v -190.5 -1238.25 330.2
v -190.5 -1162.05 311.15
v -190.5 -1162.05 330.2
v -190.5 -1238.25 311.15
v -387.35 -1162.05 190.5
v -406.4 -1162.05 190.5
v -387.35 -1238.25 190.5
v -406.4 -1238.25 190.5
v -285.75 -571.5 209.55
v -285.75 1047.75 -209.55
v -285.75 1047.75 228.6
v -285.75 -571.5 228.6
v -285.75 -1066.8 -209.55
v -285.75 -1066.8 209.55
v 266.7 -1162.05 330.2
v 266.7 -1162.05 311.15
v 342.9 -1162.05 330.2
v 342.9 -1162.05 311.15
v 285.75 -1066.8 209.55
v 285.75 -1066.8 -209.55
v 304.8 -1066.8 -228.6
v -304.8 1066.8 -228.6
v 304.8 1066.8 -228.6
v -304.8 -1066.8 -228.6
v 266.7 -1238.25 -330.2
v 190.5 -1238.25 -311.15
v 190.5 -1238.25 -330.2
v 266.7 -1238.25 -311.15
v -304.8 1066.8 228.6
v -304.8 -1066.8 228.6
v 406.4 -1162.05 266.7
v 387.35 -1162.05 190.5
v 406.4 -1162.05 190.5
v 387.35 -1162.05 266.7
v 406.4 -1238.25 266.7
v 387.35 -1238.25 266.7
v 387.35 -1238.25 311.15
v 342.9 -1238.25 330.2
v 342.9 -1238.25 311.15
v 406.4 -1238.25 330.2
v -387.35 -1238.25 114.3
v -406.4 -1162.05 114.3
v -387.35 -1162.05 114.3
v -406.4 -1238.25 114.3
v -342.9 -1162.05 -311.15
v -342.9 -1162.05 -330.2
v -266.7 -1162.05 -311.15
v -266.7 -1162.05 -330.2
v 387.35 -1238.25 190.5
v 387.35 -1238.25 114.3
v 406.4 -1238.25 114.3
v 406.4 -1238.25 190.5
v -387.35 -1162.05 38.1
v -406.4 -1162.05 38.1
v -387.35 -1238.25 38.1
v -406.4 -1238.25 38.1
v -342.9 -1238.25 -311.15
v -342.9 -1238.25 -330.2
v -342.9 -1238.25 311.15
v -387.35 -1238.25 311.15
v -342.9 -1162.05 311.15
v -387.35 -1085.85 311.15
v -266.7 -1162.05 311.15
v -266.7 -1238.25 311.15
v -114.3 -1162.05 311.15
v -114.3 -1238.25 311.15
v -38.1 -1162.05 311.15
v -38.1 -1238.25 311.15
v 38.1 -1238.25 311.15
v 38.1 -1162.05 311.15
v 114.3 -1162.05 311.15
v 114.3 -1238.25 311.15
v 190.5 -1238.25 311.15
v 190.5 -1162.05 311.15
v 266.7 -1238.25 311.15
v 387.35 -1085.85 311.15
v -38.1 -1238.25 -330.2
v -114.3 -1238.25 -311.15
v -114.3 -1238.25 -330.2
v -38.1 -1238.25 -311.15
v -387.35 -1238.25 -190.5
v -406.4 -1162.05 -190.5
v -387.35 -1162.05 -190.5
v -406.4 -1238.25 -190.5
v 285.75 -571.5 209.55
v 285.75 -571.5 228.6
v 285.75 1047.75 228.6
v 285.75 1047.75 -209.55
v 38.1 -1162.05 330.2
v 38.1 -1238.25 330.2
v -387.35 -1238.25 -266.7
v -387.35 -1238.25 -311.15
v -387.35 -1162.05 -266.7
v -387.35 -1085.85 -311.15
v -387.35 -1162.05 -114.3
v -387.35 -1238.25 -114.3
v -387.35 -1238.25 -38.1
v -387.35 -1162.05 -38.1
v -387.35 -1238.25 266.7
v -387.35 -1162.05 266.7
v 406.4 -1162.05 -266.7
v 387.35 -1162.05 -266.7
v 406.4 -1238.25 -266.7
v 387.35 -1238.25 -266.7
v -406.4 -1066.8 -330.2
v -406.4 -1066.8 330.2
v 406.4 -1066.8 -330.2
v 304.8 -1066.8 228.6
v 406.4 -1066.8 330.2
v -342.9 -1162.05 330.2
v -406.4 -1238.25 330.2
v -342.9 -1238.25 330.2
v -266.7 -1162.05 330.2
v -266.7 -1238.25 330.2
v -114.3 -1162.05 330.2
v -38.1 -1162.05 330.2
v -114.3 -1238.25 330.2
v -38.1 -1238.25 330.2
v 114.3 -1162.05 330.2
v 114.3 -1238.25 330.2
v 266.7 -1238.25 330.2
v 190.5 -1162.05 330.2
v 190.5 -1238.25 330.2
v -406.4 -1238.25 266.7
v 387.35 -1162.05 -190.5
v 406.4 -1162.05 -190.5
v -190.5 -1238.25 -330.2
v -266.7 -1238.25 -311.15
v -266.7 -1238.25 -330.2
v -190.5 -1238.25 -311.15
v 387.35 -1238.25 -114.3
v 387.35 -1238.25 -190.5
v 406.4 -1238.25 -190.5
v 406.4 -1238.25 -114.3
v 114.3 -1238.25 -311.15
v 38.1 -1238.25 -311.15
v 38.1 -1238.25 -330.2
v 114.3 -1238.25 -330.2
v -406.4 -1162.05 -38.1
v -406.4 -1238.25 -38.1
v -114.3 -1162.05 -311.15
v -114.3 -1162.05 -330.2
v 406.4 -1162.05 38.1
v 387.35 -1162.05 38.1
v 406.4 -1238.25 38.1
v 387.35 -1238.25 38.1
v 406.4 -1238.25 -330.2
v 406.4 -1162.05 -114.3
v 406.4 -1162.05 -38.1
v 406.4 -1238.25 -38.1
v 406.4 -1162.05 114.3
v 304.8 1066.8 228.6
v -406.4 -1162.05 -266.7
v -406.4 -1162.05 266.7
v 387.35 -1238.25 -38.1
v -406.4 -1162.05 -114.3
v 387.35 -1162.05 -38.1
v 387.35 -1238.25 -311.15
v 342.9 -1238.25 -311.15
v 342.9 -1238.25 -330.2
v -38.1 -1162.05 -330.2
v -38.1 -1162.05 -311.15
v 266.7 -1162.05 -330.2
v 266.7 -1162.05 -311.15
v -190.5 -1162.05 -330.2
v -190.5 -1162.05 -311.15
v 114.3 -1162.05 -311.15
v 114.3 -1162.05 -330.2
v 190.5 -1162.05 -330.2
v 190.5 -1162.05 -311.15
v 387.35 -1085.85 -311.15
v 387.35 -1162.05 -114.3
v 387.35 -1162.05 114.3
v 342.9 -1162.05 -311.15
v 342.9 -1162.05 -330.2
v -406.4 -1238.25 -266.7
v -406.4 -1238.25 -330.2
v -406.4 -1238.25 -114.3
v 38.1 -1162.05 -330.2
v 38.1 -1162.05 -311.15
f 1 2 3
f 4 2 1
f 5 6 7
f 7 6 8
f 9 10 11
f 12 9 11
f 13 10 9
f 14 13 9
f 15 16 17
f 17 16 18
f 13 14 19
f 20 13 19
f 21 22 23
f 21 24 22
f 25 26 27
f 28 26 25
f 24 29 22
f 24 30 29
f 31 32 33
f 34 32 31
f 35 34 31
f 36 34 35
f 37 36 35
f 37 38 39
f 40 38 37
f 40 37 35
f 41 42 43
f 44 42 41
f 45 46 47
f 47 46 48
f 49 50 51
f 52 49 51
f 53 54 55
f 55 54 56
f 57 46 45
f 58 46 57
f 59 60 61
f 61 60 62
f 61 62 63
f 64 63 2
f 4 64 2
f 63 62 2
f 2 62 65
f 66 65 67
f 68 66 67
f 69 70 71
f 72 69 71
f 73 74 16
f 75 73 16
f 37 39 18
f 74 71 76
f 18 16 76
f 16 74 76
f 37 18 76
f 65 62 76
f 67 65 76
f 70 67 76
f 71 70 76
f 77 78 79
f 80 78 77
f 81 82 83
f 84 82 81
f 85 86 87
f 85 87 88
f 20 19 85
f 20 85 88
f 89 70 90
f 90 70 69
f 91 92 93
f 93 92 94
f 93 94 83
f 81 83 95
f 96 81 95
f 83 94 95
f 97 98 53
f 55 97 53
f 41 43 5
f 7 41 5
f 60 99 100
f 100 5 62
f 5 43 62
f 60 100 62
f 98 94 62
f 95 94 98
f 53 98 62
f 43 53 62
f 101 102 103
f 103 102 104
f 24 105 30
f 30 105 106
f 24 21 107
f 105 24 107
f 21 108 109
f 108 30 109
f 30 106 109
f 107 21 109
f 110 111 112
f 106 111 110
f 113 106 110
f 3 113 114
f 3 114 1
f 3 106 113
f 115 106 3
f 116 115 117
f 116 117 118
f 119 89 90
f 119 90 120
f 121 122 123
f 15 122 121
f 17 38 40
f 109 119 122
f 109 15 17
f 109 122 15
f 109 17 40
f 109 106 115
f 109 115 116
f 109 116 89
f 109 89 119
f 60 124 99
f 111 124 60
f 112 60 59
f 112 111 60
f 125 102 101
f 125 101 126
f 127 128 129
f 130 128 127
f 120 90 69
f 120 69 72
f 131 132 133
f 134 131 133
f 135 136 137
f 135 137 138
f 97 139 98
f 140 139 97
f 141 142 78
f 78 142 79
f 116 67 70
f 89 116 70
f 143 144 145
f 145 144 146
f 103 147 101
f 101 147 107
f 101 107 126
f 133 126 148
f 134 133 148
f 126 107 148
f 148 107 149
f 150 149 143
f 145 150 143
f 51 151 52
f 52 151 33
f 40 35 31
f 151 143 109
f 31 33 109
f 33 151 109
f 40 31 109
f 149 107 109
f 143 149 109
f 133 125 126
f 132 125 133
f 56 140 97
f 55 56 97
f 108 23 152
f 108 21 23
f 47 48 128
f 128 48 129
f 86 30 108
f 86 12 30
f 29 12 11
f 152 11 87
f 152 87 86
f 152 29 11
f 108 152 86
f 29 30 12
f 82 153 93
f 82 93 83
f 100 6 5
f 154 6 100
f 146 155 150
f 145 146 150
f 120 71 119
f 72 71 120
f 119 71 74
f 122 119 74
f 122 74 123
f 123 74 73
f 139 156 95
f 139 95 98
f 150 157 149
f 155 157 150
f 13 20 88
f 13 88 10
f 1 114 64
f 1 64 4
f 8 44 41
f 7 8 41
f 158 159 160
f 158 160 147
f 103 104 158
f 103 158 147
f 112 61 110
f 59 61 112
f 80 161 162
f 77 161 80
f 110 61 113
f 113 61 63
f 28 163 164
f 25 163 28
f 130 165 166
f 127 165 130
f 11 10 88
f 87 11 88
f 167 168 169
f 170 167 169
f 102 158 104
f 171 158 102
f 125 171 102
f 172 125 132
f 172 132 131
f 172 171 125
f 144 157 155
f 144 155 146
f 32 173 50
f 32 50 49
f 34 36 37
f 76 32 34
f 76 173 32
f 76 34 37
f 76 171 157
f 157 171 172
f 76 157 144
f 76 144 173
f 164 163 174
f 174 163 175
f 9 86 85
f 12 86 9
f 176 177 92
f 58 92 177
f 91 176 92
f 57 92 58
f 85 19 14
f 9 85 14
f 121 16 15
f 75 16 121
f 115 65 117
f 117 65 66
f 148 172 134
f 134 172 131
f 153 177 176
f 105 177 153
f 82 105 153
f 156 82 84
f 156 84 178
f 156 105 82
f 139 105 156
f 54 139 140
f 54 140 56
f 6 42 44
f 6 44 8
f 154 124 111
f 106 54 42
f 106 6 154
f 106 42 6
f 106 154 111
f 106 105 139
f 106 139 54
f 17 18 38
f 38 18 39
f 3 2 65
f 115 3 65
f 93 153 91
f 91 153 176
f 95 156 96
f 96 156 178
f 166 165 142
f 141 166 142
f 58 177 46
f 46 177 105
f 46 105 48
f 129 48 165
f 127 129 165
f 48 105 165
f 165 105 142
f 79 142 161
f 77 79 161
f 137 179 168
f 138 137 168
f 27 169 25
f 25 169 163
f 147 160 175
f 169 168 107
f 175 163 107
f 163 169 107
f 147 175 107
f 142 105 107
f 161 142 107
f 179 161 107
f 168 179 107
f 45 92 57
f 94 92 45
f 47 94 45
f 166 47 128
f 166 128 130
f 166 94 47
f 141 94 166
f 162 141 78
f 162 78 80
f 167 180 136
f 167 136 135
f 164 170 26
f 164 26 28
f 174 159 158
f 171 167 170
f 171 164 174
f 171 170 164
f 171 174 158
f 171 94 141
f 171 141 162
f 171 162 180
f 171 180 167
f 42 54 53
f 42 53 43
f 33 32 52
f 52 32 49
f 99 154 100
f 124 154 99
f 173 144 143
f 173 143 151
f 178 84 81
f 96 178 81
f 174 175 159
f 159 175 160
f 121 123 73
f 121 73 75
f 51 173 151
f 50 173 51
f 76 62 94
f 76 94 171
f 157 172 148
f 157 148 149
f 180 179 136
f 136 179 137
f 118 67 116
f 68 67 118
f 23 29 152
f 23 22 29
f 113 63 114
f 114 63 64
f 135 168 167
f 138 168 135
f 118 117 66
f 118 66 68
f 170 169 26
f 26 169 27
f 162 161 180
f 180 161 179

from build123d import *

# Parameters (mm, degrees)
F1_DEPTH  = 1066.8
F2_W      = 812.8
F2_H      = 660.4
F3_DEPTH  = 19.05
F4_W      = 812.8
F4_H      = 660.4
F4_W_2    = 774.7
F4_H_2    = 622.3
F5_DEPTH  = 152.4
F6_W      = 76.2
F6_H      = 76.2
F7_DEPTH  = 660.401
F8_W      = 76.2
F8_H      = 76.2
F9_DEPTH  = 812.801
F10_W     = 571.5
F10_H     = 19.05
F11_DEPTH = 438.15
F12_W     = 571.5
F12_H     = 19.05
F13_DEPTH = 495.3


with BuildPart() as f1:
    # F0 (on Front) → F1 (new body, symmetric)
    with BuildSketch(Plane.XZ):
        Polygon((304.8, -228.6), (304.8, 228.6), (285.75, 228.6), (285.75, 209.55), (285.75, -209.55), (-285.75, -209.55), (-285.75, 209.55), (-285.75, 228.6), (-304.8, 228.6), (-304.8, -228.6), align=None)
    extrude(amount=F1_DEPTH, both=True)

    # F2 (on face) → F3 (join)
    with BuildSketch(Plane.XZ.offset(1066.8)):
        Rectangle(F2_W, F2_H)
    extrude(amount=F3_DEPTH)

    # F4 (on face) → F5 (join)
    with BuildSketch(Plane.XZ.offset(1085.85)):
        Rectangle(F4_W, F4_H)
        Rectangle(F4_W_2, F4_H_2, mode=Mode.SUBTRACT)
    extrude(amount=F5_DEPTH)

    # F6 (on face) → F7 (cut, through all)
    with BuildSketch(Plane(origin=(0, 0, -330.2), x_dir=(1, 0, 0), z_dir=(0, 0, -1))):
        with Locations((-304.8, 1200.15)):
            Rectangle(F6_W, F6_H)
        with Locations((-152.4, 1200.15)):
            Rectangle(F6_W, F6_H)
        with Locations((0, 1200.15)):
            Rectangle(F6_W, F6_H)
        with Locations((152.4, 1200.15)):
            Rectangle(F6_W, F6_H)
        with Locations((304.8, 1200.15)):
            Rectangle(F6_W, F6_H)
    extrude(amount=-F7_DEPTH, mode=Mode.SUBTRACT)

    # F8 (on face) → F9 (cut, through all)
    with BuildSketch(Plane(origin=(-406.4, 0, 0), x_dir=(0, -1, 0), z_dir=(-1, 0, 0))):
        with Locations((1200.15, 228.6)):
            Rectangle(F8_W, F8_H)
        with Locations((1200.15, 76.2)):
            Rectangle(F8_W, F8_H)
        with Locations((1200.15, -76.2)):
            Rectangle(F8_W, F8_H)
        with Locations((1200.15, -228.6)):
            Rectangle(F8_W, F8_H)
    extrude(amount=-F9_DEPTH, mode=Mode.SUBTRACT)

    # F10 (on face) → F11 (join, through all)
    with BuildSketch(Plane.XY.offset(-209.55)):
        with Locations((0, 1057.275)):
            Rectangle(F10_W, F10_H)
    extrude(amount=F11_DEPTH)

    # F12 (on face) → F13 (join)
    with BuildSketch(Plane(origin=(0, -1066.8, 0), x_dir=(-1, 0, 0), z_dir=(0, 1, 0))):
        with Locations((0, 219.075)):
            Rectangle(F12_W, F12_H)
    extrude(amount=F13_DEPTH)


solid = f1.part
